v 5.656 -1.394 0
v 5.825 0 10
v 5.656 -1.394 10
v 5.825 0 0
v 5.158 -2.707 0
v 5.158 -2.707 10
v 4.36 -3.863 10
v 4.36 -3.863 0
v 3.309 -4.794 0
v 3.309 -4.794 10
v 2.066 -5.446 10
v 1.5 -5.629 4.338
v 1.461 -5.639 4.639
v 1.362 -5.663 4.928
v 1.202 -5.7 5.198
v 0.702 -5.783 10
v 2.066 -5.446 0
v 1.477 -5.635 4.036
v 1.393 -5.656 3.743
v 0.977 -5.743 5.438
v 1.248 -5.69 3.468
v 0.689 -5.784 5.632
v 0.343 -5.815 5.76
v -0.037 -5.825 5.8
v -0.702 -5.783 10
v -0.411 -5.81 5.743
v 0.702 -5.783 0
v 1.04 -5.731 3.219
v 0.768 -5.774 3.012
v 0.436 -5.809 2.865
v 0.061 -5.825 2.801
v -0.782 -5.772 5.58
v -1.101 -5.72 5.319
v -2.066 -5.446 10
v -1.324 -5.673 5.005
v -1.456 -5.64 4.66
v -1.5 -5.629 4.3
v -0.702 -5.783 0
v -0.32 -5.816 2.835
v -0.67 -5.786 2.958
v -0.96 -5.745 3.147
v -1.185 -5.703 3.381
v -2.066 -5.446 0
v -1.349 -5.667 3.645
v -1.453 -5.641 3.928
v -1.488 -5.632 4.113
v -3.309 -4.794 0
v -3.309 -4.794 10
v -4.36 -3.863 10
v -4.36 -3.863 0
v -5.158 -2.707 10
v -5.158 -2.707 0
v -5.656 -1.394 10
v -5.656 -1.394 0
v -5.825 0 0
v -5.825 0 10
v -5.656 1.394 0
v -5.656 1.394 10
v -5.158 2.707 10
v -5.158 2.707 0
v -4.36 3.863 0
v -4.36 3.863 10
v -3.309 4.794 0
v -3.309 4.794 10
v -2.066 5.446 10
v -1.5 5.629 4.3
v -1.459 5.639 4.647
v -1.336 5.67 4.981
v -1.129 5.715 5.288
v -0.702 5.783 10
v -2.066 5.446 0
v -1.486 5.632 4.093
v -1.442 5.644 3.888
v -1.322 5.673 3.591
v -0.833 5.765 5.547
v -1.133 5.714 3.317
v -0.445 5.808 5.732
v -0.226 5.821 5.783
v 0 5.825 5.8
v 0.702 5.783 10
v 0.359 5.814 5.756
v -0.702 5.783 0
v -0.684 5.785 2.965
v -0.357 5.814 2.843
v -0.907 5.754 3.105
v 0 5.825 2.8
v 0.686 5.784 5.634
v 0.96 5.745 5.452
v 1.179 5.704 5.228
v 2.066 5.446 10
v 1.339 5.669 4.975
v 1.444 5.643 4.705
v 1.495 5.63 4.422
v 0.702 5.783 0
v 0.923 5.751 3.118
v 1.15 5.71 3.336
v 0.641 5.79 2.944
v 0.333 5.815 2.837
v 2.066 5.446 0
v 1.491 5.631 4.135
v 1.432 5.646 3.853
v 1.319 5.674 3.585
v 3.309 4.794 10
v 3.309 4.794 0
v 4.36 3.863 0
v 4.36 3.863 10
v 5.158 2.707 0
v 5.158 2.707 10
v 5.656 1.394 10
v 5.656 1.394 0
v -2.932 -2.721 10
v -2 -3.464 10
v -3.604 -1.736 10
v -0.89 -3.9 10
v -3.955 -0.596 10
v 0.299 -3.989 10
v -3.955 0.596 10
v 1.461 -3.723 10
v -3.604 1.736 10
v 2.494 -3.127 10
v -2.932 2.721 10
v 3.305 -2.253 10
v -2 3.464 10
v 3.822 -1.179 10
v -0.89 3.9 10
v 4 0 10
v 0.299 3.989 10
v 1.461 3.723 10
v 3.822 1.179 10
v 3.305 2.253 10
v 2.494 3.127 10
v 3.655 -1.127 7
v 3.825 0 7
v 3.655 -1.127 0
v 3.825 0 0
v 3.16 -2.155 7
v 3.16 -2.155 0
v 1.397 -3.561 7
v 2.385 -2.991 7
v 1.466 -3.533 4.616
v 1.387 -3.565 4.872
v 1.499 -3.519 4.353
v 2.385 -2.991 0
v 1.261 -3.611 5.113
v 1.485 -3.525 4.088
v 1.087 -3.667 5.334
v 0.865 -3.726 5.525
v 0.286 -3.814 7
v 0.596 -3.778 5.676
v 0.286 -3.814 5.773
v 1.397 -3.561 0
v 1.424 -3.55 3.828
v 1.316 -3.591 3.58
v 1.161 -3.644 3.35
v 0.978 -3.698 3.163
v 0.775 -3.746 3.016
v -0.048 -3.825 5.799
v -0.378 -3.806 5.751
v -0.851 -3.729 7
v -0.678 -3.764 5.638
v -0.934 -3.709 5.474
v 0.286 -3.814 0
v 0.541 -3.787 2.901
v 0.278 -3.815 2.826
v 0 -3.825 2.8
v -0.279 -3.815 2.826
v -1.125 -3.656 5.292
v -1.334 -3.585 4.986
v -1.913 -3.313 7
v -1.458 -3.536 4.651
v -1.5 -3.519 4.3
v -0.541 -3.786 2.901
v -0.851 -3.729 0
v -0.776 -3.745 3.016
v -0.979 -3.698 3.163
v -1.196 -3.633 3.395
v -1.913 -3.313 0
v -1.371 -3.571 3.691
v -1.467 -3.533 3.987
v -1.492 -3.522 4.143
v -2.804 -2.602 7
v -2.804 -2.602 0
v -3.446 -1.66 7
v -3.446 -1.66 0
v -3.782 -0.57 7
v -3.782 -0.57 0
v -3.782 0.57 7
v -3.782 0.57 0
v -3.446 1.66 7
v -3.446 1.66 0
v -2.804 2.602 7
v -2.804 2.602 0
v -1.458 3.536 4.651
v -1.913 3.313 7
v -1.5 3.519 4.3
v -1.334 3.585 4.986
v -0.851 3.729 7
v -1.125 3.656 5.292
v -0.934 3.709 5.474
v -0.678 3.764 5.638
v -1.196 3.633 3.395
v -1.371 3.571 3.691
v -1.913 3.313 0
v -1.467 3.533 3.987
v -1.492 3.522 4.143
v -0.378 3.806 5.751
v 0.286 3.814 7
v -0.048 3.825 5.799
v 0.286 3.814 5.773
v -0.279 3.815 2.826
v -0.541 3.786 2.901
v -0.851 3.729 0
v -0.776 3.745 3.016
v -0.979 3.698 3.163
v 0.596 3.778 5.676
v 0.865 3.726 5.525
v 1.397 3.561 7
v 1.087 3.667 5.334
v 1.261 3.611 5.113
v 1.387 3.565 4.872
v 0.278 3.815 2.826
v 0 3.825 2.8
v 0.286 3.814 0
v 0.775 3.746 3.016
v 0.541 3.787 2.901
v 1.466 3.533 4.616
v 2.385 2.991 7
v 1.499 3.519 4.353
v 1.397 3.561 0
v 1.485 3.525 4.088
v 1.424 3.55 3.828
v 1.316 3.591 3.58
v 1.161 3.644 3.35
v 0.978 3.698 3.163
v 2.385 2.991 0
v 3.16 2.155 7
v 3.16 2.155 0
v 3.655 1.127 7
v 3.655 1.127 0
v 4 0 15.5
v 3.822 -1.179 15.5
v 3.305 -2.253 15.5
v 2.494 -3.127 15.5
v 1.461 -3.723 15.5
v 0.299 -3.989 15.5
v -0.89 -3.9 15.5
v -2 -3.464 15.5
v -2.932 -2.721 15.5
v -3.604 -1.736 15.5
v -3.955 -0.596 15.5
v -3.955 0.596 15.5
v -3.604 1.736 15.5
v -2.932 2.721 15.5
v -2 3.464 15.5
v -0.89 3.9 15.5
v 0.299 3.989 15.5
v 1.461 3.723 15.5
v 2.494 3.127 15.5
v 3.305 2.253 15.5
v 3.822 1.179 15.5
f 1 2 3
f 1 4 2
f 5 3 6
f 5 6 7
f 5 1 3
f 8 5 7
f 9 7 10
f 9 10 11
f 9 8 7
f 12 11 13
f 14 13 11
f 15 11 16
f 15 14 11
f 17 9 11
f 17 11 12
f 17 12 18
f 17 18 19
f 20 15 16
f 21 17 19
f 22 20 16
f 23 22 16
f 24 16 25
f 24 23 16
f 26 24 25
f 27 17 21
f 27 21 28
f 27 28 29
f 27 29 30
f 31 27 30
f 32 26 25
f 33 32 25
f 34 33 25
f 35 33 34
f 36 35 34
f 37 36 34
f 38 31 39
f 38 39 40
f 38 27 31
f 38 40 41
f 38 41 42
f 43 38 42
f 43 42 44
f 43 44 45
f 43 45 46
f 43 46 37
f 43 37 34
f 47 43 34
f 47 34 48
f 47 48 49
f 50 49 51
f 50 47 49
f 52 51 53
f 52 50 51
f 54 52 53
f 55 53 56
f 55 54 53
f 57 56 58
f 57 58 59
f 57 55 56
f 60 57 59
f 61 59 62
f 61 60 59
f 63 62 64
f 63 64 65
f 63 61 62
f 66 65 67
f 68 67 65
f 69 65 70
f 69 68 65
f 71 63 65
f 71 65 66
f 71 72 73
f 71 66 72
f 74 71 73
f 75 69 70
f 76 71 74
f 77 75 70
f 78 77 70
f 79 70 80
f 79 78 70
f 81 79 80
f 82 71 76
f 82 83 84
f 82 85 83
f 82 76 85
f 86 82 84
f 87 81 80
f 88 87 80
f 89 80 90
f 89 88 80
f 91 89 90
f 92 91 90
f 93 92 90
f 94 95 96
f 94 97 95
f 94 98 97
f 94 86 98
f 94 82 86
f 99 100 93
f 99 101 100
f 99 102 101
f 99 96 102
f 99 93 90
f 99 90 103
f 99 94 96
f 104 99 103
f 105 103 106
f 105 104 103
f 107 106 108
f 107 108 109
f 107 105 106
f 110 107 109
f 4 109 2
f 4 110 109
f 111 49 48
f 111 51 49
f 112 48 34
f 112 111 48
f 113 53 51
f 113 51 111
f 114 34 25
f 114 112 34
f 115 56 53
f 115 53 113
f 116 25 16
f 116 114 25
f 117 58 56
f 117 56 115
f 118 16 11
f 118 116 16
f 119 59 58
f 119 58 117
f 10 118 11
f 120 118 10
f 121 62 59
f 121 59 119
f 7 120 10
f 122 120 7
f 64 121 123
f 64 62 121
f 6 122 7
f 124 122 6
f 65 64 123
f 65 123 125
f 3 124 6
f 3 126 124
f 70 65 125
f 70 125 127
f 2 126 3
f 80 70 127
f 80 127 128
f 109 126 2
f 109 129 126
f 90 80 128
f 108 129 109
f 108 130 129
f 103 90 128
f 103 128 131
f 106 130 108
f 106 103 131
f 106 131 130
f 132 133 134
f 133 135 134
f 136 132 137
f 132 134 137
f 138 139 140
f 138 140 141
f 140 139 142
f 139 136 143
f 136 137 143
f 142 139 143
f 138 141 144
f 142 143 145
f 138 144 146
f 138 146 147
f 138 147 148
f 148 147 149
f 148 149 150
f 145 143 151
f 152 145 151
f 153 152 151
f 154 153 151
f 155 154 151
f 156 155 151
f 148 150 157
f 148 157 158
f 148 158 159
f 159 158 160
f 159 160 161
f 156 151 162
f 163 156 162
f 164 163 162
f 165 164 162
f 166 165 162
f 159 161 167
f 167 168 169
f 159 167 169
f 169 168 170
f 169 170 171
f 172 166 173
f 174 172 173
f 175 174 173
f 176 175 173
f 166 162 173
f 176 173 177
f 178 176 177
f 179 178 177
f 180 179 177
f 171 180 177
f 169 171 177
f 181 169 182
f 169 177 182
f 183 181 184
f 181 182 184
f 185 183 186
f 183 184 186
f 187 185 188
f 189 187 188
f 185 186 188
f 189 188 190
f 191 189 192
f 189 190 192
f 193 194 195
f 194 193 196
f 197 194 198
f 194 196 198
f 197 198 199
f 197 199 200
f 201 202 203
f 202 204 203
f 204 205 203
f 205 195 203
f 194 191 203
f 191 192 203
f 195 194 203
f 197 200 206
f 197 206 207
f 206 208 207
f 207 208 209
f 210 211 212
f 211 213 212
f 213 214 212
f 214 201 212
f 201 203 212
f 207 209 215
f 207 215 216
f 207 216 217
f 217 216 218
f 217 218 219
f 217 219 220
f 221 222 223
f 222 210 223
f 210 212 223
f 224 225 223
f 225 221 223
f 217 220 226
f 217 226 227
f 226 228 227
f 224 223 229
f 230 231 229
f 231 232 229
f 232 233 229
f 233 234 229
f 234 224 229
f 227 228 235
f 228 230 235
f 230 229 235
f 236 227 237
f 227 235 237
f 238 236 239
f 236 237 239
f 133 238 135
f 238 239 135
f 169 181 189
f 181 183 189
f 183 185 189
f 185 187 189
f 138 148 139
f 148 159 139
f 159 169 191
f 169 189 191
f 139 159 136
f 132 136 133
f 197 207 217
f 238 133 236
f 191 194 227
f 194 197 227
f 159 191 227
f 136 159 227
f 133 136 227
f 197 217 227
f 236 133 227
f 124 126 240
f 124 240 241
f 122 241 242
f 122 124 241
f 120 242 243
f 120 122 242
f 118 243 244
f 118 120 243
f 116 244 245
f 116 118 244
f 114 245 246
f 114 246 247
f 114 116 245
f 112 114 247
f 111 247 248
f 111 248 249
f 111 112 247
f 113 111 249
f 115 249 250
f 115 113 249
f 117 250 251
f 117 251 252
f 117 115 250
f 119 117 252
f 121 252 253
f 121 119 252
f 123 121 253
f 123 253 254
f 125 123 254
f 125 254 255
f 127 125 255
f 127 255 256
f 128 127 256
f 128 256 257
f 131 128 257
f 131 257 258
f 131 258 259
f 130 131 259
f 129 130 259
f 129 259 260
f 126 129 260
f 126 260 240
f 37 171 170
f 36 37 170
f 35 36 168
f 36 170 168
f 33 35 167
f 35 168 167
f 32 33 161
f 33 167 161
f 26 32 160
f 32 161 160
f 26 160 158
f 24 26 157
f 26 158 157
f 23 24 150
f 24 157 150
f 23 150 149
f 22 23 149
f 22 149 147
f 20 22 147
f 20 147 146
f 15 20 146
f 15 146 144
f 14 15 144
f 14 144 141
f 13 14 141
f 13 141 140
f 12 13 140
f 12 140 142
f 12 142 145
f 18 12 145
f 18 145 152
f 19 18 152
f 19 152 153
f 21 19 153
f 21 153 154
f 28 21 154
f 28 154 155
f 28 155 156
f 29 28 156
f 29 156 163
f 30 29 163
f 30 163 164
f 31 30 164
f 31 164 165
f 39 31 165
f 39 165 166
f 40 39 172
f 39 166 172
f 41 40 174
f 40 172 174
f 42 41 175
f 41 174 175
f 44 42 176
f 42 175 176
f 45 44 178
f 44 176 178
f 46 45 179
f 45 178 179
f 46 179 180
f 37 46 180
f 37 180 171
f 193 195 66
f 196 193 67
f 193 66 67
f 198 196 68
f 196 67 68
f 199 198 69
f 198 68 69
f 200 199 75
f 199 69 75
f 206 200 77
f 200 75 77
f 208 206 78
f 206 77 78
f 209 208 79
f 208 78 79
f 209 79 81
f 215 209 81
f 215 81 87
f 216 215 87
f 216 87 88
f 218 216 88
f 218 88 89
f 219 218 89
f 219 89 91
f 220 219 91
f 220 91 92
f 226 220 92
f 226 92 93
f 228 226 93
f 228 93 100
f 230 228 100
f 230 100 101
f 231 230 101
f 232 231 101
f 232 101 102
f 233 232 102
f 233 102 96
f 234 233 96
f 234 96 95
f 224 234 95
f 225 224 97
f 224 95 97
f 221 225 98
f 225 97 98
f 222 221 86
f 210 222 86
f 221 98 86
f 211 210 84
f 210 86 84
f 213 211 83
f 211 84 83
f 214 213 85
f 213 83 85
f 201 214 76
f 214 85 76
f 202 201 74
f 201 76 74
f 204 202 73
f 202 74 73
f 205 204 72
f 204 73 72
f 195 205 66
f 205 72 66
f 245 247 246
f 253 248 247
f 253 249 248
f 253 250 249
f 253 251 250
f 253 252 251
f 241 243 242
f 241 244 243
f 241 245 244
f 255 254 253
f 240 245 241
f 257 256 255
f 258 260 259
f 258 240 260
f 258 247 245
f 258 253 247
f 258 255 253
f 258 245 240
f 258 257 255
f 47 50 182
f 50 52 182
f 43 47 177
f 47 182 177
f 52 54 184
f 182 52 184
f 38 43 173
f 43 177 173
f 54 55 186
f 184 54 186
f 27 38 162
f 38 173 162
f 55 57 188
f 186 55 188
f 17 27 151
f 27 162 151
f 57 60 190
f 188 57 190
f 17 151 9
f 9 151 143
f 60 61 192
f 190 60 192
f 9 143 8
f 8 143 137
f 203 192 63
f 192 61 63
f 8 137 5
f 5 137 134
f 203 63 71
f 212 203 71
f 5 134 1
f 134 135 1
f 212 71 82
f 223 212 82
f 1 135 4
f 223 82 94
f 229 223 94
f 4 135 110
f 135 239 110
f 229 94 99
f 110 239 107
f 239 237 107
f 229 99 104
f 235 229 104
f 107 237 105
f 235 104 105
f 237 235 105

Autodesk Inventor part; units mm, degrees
ref_plane "YZ Plane" through (0, 0, 0) normal (1, 0, 0) x (0, 1, 0)
ref_plane "XZ Plane" through (0, 0, 0) normal (0, 1, 0) x (-1, 0, 0)
sketch "Sketch1" plane through (0, 0, 0) normal (0, 0, 1) x (1, 0, 0)
  circle A0 centre (0, 0) radius 3.825
  circle A1 centre (0, 0) radius 5.825
  dimension "d0" = 7.65
  dimension "d1" = 2
extrude "Extrusion1" add sketch "Sketch1" along normal blind 10
sketch "Sketch2" plane through (0, 0, 10) normal (0, 0, 1) x (1, 0, 0)
  circle A0 centre (0, 0) radius 4
  dimension "d4" = 8
extrude "Extrusion2" add sketch "Sketch2" along normal mid plane 6
move faces "Move1" translate (0, 0, 2.5) faces at (0.7574, 1.0973, 13)
sketch "Sketch3" plane through (0, 0, 0) normal (0, 0, -1) x (-1, 0, 0)
  line L0 (0, 0) -> (0, 5.825)
  circle A0 centre (0, 0) radius 5.825 projected
ref_plane "Work Plane1" through (0, 5.825, 0) normal (0, 1, 0) x (-1, 0, 0)
sketch "Sketch4" plane through (0, 5.825, 0) normal (0, 1, 0) x (-1, 0, 0)
  circle A0 centre (0, 4.3) radius 1.5
  point P0 (0, 0)
  dimension "d10" = 3
  dimension "d11" = 4.3
extrude "Extrusion3" cut sketch "Sketch4" against normal through all
properties part number "shaft_extension2"
